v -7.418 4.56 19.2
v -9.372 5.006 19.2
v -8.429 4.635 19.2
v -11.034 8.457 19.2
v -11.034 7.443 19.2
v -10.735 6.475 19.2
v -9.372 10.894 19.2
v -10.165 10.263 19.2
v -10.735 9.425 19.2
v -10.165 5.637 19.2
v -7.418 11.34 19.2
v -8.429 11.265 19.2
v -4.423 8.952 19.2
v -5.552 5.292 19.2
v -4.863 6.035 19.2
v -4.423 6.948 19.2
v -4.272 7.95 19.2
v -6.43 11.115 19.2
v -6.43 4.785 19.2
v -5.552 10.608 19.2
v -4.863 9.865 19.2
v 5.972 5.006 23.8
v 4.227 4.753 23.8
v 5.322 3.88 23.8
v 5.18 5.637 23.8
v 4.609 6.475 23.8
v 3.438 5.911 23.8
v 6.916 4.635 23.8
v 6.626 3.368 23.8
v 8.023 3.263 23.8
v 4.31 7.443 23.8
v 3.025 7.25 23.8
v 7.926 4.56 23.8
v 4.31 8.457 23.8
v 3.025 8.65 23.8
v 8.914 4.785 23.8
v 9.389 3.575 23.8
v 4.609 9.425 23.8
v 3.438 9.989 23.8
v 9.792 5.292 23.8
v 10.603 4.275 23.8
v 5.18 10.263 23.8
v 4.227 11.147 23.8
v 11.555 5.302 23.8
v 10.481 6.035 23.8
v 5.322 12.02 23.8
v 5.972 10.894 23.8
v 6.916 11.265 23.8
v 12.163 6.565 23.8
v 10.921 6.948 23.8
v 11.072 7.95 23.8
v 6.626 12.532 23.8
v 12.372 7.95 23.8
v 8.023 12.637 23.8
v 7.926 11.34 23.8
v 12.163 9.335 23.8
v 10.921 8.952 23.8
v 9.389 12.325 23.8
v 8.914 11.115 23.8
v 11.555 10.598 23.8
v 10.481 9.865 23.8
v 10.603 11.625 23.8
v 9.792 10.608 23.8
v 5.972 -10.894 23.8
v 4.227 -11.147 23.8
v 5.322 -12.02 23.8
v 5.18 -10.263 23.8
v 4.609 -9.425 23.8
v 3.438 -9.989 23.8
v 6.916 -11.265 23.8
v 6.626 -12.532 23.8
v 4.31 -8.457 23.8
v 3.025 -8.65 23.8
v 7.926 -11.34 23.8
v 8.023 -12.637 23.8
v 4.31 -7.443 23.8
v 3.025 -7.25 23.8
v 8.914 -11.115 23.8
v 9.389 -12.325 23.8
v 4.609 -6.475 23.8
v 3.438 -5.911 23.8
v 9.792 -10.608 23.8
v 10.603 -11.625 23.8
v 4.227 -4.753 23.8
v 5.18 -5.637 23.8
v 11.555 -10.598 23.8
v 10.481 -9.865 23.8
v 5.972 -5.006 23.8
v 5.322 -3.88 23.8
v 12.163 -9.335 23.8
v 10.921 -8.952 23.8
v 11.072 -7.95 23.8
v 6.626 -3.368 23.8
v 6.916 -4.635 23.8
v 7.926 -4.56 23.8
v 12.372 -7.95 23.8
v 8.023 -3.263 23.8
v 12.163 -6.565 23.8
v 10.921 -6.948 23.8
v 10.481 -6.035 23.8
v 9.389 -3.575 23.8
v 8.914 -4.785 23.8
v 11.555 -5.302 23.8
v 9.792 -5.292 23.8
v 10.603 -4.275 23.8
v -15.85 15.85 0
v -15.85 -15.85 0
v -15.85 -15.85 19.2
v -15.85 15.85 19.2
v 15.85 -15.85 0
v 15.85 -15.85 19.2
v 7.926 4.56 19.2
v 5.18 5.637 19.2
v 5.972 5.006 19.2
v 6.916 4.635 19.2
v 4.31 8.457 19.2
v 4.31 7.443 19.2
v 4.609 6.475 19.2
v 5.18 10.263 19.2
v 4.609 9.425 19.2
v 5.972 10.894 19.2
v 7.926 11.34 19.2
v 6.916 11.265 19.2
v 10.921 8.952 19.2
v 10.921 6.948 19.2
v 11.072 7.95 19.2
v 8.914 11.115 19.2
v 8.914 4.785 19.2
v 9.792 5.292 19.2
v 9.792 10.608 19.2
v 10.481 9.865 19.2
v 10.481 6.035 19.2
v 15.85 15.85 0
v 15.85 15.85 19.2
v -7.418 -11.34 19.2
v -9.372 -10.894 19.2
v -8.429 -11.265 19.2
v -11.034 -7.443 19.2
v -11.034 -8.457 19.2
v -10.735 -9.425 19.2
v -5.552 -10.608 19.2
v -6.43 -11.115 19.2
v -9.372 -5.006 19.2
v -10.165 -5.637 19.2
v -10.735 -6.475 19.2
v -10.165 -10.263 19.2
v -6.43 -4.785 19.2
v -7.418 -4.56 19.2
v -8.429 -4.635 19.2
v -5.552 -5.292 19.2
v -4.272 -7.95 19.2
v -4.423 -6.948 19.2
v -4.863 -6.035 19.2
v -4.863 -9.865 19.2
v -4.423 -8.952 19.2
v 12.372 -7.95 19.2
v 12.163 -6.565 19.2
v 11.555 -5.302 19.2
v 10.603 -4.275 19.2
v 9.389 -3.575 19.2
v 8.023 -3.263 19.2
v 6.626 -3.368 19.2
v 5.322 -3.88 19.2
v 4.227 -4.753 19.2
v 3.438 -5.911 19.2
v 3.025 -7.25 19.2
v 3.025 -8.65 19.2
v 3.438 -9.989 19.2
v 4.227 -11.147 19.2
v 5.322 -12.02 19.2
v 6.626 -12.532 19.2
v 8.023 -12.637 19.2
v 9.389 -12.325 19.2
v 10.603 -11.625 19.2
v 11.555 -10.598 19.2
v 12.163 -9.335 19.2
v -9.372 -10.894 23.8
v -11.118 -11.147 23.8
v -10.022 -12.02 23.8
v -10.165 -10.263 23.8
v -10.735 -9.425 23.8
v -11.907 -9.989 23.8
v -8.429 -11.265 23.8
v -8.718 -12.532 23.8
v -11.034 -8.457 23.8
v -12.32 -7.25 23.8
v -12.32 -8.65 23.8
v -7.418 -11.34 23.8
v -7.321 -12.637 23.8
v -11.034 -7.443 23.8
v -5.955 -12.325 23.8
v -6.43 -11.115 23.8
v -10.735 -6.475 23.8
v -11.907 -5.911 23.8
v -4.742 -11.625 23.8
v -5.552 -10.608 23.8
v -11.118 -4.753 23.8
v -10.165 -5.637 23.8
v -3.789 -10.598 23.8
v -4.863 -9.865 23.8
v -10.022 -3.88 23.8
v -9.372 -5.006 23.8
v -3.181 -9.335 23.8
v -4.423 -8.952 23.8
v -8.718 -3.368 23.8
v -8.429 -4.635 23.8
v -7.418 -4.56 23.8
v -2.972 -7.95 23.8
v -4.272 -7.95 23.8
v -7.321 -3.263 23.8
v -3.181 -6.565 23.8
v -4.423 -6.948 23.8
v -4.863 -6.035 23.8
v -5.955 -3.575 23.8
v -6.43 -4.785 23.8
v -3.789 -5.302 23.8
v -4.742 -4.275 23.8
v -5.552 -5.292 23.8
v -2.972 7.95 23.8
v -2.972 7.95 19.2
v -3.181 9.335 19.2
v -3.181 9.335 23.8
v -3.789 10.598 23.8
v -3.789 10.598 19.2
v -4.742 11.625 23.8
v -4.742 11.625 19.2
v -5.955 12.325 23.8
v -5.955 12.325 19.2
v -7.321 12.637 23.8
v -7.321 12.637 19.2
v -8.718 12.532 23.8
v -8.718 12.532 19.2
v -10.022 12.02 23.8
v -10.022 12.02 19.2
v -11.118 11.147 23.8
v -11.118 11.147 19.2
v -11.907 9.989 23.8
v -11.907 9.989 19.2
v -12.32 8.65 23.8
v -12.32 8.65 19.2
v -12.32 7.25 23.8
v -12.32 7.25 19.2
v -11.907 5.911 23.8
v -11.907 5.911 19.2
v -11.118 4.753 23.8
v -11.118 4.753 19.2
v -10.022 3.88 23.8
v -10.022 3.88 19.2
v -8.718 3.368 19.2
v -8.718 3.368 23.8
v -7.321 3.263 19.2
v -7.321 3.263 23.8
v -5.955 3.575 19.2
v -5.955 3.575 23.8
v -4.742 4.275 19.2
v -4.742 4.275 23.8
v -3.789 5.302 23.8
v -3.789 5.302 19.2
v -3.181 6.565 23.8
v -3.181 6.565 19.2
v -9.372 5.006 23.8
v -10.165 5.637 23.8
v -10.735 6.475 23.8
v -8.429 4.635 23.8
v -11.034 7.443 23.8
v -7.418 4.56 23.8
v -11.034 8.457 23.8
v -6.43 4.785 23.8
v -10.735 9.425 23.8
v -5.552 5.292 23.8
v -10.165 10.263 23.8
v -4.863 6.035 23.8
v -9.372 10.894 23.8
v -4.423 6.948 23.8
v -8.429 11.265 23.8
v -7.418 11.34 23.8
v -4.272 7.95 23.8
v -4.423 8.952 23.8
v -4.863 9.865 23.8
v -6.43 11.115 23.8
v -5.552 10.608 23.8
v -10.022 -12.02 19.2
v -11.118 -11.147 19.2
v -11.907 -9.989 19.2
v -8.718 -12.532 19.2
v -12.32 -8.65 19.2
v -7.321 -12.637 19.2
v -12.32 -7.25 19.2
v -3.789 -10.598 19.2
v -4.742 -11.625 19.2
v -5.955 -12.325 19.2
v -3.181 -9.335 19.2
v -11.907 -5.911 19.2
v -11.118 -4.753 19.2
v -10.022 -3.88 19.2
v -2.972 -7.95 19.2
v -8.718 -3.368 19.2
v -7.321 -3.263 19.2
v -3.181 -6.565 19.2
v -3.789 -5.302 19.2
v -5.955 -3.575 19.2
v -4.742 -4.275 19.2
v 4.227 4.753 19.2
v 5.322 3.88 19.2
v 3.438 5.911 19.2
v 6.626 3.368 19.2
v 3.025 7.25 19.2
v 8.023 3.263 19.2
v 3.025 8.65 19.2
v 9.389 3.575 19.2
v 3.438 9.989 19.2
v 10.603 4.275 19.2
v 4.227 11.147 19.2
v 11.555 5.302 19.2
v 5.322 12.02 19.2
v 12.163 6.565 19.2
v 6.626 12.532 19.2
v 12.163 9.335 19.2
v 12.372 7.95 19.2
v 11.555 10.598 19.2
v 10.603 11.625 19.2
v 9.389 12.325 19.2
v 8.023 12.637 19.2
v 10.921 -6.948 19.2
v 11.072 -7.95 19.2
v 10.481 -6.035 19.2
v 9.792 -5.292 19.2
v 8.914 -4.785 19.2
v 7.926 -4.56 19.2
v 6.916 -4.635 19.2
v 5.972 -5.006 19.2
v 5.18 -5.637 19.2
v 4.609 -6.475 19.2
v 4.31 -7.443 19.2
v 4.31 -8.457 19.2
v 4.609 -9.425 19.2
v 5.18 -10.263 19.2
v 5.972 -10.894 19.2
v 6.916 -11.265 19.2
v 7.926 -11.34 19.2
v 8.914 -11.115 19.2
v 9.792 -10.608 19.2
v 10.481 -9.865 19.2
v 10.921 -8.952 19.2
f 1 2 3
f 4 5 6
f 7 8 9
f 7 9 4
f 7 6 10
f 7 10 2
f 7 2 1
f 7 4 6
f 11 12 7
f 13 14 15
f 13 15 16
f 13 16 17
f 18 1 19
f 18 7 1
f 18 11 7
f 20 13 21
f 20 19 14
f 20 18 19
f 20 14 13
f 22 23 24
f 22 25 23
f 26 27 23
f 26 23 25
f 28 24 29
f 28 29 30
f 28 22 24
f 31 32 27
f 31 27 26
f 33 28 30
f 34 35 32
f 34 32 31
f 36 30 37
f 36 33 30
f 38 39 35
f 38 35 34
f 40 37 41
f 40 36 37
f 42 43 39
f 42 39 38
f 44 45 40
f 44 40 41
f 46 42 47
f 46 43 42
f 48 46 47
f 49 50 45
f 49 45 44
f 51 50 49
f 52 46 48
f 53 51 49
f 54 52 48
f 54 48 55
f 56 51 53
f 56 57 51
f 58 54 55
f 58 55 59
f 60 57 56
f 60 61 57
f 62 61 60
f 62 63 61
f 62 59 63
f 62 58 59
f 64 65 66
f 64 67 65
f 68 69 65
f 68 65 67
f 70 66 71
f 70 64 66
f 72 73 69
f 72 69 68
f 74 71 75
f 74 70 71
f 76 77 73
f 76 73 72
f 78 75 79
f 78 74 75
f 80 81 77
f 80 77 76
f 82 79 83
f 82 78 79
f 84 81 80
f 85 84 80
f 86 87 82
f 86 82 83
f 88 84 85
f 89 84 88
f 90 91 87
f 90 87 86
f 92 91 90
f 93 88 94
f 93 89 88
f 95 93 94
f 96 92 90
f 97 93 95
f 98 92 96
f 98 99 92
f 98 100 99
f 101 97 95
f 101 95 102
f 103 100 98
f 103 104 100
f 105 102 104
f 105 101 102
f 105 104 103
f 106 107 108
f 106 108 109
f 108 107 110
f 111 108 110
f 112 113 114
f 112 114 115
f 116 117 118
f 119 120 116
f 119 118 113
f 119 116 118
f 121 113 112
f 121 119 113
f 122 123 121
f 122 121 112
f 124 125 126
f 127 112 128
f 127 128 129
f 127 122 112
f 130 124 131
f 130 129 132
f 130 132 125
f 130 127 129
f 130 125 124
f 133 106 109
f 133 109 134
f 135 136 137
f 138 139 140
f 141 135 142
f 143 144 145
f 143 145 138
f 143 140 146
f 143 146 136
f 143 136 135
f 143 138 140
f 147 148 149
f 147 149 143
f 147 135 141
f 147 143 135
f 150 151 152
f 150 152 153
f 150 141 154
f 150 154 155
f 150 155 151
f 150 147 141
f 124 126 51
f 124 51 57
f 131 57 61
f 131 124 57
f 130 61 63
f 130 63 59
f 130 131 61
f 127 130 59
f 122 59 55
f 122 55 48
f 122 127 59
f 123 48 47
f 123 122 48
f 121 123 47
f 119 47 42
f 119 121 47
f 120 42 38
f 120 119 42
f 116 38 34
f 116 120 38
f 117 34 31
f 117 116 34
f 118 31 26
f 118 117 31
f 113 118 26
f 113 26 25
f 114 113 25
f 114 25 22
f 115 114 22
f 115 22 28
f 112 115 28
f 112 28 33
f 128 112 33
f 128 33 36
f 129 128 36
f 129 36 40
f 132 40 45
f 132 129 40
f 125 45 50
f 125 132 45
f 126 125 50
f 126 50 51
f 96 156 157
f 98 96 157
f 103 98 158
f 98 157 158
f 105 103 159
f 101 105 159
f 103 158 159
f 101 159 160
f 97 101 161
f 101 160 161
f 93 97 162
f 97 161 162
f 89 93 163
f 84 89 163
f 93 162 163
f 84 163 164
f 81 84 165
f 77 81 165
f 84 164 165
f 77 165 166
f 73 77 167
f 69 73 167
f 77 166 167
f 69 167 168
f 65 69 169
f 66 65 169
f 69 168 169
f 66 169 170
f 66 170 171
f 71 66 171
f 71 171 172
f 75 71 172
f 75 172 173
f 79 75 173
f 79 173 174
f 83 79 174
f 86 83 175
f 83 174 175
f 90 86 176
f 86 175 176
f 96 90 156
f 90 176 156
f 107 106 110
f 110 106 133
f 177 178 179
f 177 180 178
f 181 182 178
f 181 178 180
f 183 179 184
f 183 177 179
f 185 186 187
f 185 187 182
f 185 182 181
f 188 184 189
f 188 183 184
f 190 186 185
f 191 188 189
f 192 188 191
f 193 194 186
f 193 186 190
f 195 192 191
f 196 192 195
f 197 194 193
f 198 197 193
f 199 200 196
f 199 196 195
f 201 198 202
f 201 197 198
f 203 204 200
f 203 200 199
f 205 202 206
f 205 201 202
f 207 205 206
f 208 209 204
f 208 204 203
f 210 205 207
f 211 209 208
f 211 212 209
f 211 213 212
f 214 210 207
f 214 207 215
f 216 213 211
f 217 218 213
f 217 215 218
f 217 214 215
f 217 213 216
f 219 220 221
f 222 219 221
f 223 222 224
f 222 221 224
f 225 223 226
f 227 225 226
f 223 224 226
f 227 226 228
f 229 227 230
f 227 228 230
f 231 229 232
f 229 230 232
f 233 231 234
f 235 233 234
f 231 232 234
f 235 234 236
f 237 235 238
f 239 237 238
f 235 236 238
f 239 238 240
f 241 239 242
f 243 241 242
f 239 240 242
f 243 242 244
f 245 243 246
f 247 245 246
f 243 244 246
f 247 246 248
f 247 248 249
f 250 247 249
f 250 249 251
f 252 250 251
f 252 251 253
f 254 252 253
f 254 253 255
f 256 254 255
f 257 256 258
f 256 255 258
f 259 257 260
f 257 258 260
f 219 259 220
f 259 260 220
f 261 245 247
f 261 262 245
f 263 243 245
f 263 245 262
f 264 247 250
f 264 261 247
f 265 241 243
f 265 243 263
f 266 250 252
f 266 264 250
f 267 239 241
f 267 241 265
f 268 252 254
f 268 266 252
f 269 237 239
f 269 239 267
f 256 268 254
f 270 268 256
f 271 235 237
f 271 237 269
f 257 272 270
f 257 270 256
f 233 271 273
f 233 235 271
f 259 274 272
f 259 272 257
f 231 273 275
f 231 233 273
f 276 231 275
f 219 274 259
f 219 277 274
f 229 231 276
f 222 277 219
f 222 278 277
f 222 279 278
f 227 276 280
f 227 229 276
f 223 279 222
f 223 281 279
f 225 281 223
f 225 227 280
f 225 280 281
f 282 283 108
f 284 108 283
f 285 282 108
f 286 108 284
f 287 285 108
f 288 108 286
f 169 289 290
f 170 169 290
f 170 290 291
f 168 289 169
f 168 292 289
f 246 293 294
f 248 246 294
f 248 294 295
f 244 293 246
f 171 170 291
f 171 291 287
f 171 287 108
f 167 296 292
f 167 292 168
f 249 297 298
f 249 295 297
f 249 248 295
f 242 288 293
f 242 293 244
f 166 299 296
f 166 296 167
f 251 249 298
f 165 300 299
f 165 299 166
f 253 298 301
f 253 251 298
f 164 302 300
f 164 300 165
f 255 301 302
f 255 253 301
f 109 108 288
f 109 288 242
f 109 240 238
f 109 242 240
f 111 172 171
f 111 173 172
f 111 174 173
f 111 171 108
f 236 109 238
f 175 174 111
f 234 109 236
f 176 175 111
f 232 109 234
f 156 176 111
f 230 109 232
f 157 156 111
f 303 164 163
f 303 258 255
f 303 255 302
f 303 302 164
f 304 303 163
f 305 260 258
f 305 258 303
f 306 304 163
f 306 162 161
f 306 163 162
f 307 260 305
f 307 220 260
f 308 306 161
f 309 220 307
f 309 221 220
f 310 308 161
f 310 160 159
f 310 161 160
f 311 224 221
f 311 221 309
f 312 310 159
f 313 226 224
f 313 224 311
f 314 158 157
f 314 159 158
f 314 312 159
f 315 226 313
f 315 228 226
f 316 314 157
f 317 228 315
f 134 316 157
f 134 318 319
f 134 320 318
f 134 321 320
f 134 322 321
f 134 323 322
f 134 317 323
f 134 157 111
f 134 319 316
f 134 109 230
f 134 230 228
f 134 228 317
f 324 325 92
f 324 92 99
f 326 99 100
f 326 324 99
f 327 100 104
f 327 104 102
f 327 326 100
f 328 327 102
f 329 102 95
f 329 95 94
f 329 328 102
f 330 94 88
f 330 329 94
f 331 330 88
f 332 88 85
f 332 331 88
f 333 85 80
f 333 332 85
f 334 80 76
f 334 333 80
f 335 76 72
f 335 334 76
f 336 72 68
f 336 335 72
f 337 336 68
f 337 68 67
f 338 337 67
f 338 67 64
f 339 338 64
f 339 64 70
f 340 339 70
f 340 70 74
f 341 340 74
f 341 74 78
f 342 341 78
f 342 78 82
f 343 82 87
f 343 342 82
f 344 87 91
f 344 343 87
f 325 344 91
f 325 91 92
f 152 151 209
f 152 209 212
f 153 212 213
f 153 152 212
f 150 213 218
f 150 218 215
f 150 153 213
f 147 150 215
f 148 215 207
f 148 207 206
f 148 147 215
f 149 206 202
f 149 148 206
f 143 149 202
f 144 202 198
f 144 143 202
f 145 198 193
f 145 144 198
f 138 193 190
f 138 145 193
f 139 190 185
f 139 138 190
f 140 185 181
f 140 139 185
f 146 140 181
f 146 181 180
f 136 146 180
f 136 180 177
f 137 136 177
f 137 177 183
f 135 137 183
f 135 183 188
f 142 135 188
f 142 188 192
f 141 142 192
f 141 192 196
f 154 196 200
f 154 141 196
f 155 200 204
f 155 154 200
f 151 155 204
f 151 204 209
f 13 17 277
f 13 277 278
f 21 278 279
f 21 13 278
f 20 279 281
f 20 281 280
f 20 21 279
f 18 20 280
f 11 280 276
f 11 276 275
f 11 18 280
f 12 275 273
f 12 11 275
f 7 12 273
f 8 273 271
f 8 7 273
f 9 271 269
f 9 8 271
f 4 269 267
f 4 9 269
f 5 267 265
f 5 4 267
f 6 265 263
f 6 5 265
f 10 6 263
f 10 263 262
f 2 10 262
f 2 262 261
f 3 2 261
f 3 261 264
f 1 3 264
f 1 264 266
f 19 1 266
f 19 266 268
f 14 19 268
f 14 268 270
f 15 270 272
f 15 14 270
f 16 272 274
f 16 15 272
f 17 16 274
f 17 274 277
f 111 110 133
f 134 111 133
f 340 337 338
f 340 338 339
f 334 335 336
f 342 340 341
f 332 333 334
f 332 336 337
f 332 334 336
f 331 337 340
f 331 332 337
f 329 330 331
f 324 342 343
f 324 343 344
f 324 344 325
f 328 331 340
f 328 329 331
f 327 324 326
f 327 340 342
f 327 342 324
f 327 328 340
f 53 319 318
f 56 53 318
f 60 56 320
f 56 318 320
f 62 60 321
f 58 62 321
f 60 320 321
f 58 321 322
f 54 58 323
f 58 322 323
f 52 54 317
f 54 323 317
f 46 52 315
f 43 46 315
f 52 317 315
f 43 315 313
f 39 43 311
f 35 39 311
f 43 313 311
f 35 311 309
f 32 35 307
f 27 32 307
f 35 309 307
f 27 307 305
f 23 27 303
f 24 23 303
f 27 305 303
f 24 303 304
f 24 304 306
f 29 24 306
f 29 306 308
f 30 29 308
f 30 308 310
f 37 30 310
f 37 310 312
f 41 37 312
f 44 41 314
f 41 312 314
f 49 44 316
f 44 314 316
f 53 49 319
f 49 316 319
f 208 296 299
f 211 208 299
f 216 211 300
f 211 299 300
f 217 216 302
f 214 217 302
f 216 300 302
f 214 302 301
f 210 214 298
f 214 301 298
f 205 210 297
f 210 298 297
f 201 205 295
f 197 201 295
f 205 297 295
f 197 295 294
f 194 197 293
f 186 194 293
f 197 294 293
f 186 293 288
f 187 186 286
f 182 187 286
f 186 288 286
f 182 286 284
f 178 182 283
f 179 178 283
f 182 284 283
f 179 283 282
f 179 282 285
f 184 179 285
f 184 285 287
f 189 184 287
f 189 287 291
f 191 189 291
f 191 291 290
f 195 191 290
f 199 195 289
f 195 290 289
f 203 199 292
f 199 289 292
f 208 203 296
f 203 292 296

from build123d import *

# Parameters (mm, degrees)
F0_W     = 31.7
F0_H     = 31.7
F1_DEPTH = 19.2
F2_R     = 4.7
F2_R_2   = 3.4
F3_DEPTH = 4.6


with BuildPart() as f1:
    # F0 (on Top) → F1 (new body)
    with BuildSketch(Plane.XY):
        Rectangle(F0_W, F0_H)
    extrude(amount=F1_DEPTH)

    # F2 (on face) → F3 (join)
    with BuildSketch(Plane.XY.offset(19.2)):
        with Locations((-7.672173, 7.95)):
            Circle(F2_R)
        with Locations((-7.672173, 7.95)):
            Circle(F2_R_2, mode=Mode.SUBTRACT)
        with Locations((7.672173, 7.95)):
            Circle(F2_R)
        with Locations((7.672173, 7.95)):
            Circle(F2_R_2, mode=Mode.SUBTRACT)
        with Locations((-7.672173, -7.95)):
            Circle(F2_R)
        with Locations((-7.672173, -7.95)):
            Circle(F2_R_2, mode=Mode.SUBTRACT)
        with Locations((7.672173, -7.95)):
            Circle(F2_R)
        with Locations((7.672173, -7.95)):
            Circle(F2_R_2, mode=Mode.SUBTRACT)
    extrude(amount=F3_DEPTH)


solid = f1.part
